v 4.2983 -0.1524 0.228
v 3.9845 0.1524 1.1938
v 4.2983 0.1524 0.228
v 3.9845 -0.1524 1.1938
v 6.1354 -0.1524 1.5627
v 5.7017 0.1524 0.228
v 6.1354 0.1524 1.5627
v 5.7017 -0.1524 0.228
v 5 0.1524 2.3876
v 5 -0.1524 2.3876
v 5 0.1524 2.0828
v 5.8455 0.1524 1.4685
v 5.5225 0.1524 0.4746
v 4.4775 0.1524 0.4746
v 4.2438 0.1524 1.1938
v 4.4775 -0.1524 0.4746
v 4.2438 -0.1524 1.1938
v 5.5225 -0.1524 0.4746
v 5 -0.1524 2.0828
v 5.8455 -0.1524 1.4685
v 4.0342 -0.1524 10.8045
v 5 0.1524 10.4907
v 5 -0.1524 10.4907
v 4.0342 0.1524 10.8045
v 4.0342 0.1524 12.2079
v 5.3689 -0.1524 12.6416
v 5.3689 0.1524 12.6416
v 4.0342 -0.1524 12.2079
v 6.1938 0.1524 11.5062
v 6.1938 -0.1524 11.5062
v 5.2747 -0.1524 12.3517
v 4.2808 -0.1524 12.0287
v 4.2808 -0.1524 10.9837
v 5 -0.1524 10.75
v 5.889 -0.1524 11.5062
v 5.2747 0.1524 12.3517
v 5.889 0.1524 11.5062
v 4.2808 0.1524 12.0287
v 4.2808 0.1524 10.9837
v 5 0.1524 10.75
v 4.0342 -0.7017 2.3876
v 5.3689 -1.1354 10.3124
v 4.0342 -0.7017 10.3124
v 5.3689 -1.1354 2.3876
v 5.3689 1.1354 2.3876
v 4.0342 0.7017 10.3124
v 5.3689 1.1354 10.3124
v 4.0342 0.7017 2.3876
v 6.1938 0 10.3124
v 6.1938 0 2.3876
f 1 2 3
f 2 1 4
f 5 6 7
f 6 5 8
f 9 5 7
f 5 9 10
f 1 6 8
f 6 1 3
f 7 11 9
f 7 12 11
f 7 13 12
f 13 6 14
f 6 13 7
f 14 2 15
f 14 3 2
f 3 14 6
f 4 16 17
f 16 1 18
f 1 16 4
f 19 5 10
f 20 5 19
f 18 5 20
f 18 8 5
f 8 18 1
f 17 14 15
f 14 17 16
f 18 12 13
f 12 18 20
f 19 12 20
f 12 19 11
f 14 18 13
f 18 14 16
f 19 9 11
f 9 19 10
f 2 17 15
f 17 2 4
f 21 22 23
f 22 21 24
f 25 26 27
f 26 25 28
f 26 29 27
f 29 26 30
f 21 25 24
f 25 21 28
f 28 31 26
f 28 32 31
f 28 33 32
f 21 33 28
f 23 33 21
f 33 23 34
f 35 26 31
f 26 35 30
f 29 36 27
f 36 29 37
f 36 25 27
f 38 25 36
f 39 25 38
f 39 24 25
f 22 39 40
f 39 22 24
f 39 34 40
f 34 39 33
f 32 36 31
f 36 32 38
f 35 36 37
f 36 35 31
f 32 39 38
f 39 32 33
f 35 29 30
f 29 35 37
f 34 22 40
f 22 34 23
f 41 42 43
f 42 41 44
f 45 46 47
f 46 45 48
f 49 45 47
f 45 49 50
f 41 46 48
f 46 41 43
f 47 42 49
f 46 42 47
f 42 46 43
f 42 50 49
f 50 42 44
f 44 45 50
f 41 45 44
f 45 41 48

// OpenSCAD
// file: spring.scad
mm = 25.4;

spring_dia = 0.094*mm;
spring_len = 0.5*mm;
wire_dia = 0.012*mm;
attach_wire_dia = 1.5;
attach_ring_dia = 5;

coil_len = spring_len - 2*spring_dia;

module hook() {
  rotate( [90, 0, 0]) {
    translate( [0, 0, -wire_dia/2]) {
      difference() {
	cylinder( h=wire_dia, d=spring_dia);
	translate( [0, 0, -e])
	  cylinder( h=wire_dia+2*e, d=spring_dia-2*wire_dia);
	// make it a hook
	rotate( [0, 0, -90])
	translate( [0, 0, -wire_dia-e])
	  cube( [spring_dia+wire_dia+e, spring_dia+wire_dia+e, wire_dia*2+2*e]);
      }
    }
  }
}

// define a module to create a ring to hook the spring onto
module spring_attach() {
  rotate( [90, 180, 0]) {
    translate( [0, 0, -attach_wire_dia/2]) {
      difference() {
	   union() {
		cylinder( h=attach_wire_dia, d=attach_ring_dia);
		translate( [-attach_ring_dia/2, 0, 0])
		     cube( [attach_ring_dia, attach_ring_dia/2, attach_wire_dia]);
	   }
	translate( [0, 0, -e])
	  cylinder( h=attach_wire_dia+2*e, d=attach_ring_dia-2*attach_wire_dia);
      }
    }
  }
}
  

// spring with hooks
module spring() {
  translate( [0, 0, spring_dia])
    cylinder( h=coil_len, d=spring_dia);
  // generate hooks
  translate( [0, 0, spring_dia/2])
        rotate( [0, -90, 180])
    hook();
  translate( [0, 0, spring_len-spring_dia/2])
    hook();
}
// main file
e = 0.1;

include <spring.scad>

translate( [5, 0, 0])
spring();
